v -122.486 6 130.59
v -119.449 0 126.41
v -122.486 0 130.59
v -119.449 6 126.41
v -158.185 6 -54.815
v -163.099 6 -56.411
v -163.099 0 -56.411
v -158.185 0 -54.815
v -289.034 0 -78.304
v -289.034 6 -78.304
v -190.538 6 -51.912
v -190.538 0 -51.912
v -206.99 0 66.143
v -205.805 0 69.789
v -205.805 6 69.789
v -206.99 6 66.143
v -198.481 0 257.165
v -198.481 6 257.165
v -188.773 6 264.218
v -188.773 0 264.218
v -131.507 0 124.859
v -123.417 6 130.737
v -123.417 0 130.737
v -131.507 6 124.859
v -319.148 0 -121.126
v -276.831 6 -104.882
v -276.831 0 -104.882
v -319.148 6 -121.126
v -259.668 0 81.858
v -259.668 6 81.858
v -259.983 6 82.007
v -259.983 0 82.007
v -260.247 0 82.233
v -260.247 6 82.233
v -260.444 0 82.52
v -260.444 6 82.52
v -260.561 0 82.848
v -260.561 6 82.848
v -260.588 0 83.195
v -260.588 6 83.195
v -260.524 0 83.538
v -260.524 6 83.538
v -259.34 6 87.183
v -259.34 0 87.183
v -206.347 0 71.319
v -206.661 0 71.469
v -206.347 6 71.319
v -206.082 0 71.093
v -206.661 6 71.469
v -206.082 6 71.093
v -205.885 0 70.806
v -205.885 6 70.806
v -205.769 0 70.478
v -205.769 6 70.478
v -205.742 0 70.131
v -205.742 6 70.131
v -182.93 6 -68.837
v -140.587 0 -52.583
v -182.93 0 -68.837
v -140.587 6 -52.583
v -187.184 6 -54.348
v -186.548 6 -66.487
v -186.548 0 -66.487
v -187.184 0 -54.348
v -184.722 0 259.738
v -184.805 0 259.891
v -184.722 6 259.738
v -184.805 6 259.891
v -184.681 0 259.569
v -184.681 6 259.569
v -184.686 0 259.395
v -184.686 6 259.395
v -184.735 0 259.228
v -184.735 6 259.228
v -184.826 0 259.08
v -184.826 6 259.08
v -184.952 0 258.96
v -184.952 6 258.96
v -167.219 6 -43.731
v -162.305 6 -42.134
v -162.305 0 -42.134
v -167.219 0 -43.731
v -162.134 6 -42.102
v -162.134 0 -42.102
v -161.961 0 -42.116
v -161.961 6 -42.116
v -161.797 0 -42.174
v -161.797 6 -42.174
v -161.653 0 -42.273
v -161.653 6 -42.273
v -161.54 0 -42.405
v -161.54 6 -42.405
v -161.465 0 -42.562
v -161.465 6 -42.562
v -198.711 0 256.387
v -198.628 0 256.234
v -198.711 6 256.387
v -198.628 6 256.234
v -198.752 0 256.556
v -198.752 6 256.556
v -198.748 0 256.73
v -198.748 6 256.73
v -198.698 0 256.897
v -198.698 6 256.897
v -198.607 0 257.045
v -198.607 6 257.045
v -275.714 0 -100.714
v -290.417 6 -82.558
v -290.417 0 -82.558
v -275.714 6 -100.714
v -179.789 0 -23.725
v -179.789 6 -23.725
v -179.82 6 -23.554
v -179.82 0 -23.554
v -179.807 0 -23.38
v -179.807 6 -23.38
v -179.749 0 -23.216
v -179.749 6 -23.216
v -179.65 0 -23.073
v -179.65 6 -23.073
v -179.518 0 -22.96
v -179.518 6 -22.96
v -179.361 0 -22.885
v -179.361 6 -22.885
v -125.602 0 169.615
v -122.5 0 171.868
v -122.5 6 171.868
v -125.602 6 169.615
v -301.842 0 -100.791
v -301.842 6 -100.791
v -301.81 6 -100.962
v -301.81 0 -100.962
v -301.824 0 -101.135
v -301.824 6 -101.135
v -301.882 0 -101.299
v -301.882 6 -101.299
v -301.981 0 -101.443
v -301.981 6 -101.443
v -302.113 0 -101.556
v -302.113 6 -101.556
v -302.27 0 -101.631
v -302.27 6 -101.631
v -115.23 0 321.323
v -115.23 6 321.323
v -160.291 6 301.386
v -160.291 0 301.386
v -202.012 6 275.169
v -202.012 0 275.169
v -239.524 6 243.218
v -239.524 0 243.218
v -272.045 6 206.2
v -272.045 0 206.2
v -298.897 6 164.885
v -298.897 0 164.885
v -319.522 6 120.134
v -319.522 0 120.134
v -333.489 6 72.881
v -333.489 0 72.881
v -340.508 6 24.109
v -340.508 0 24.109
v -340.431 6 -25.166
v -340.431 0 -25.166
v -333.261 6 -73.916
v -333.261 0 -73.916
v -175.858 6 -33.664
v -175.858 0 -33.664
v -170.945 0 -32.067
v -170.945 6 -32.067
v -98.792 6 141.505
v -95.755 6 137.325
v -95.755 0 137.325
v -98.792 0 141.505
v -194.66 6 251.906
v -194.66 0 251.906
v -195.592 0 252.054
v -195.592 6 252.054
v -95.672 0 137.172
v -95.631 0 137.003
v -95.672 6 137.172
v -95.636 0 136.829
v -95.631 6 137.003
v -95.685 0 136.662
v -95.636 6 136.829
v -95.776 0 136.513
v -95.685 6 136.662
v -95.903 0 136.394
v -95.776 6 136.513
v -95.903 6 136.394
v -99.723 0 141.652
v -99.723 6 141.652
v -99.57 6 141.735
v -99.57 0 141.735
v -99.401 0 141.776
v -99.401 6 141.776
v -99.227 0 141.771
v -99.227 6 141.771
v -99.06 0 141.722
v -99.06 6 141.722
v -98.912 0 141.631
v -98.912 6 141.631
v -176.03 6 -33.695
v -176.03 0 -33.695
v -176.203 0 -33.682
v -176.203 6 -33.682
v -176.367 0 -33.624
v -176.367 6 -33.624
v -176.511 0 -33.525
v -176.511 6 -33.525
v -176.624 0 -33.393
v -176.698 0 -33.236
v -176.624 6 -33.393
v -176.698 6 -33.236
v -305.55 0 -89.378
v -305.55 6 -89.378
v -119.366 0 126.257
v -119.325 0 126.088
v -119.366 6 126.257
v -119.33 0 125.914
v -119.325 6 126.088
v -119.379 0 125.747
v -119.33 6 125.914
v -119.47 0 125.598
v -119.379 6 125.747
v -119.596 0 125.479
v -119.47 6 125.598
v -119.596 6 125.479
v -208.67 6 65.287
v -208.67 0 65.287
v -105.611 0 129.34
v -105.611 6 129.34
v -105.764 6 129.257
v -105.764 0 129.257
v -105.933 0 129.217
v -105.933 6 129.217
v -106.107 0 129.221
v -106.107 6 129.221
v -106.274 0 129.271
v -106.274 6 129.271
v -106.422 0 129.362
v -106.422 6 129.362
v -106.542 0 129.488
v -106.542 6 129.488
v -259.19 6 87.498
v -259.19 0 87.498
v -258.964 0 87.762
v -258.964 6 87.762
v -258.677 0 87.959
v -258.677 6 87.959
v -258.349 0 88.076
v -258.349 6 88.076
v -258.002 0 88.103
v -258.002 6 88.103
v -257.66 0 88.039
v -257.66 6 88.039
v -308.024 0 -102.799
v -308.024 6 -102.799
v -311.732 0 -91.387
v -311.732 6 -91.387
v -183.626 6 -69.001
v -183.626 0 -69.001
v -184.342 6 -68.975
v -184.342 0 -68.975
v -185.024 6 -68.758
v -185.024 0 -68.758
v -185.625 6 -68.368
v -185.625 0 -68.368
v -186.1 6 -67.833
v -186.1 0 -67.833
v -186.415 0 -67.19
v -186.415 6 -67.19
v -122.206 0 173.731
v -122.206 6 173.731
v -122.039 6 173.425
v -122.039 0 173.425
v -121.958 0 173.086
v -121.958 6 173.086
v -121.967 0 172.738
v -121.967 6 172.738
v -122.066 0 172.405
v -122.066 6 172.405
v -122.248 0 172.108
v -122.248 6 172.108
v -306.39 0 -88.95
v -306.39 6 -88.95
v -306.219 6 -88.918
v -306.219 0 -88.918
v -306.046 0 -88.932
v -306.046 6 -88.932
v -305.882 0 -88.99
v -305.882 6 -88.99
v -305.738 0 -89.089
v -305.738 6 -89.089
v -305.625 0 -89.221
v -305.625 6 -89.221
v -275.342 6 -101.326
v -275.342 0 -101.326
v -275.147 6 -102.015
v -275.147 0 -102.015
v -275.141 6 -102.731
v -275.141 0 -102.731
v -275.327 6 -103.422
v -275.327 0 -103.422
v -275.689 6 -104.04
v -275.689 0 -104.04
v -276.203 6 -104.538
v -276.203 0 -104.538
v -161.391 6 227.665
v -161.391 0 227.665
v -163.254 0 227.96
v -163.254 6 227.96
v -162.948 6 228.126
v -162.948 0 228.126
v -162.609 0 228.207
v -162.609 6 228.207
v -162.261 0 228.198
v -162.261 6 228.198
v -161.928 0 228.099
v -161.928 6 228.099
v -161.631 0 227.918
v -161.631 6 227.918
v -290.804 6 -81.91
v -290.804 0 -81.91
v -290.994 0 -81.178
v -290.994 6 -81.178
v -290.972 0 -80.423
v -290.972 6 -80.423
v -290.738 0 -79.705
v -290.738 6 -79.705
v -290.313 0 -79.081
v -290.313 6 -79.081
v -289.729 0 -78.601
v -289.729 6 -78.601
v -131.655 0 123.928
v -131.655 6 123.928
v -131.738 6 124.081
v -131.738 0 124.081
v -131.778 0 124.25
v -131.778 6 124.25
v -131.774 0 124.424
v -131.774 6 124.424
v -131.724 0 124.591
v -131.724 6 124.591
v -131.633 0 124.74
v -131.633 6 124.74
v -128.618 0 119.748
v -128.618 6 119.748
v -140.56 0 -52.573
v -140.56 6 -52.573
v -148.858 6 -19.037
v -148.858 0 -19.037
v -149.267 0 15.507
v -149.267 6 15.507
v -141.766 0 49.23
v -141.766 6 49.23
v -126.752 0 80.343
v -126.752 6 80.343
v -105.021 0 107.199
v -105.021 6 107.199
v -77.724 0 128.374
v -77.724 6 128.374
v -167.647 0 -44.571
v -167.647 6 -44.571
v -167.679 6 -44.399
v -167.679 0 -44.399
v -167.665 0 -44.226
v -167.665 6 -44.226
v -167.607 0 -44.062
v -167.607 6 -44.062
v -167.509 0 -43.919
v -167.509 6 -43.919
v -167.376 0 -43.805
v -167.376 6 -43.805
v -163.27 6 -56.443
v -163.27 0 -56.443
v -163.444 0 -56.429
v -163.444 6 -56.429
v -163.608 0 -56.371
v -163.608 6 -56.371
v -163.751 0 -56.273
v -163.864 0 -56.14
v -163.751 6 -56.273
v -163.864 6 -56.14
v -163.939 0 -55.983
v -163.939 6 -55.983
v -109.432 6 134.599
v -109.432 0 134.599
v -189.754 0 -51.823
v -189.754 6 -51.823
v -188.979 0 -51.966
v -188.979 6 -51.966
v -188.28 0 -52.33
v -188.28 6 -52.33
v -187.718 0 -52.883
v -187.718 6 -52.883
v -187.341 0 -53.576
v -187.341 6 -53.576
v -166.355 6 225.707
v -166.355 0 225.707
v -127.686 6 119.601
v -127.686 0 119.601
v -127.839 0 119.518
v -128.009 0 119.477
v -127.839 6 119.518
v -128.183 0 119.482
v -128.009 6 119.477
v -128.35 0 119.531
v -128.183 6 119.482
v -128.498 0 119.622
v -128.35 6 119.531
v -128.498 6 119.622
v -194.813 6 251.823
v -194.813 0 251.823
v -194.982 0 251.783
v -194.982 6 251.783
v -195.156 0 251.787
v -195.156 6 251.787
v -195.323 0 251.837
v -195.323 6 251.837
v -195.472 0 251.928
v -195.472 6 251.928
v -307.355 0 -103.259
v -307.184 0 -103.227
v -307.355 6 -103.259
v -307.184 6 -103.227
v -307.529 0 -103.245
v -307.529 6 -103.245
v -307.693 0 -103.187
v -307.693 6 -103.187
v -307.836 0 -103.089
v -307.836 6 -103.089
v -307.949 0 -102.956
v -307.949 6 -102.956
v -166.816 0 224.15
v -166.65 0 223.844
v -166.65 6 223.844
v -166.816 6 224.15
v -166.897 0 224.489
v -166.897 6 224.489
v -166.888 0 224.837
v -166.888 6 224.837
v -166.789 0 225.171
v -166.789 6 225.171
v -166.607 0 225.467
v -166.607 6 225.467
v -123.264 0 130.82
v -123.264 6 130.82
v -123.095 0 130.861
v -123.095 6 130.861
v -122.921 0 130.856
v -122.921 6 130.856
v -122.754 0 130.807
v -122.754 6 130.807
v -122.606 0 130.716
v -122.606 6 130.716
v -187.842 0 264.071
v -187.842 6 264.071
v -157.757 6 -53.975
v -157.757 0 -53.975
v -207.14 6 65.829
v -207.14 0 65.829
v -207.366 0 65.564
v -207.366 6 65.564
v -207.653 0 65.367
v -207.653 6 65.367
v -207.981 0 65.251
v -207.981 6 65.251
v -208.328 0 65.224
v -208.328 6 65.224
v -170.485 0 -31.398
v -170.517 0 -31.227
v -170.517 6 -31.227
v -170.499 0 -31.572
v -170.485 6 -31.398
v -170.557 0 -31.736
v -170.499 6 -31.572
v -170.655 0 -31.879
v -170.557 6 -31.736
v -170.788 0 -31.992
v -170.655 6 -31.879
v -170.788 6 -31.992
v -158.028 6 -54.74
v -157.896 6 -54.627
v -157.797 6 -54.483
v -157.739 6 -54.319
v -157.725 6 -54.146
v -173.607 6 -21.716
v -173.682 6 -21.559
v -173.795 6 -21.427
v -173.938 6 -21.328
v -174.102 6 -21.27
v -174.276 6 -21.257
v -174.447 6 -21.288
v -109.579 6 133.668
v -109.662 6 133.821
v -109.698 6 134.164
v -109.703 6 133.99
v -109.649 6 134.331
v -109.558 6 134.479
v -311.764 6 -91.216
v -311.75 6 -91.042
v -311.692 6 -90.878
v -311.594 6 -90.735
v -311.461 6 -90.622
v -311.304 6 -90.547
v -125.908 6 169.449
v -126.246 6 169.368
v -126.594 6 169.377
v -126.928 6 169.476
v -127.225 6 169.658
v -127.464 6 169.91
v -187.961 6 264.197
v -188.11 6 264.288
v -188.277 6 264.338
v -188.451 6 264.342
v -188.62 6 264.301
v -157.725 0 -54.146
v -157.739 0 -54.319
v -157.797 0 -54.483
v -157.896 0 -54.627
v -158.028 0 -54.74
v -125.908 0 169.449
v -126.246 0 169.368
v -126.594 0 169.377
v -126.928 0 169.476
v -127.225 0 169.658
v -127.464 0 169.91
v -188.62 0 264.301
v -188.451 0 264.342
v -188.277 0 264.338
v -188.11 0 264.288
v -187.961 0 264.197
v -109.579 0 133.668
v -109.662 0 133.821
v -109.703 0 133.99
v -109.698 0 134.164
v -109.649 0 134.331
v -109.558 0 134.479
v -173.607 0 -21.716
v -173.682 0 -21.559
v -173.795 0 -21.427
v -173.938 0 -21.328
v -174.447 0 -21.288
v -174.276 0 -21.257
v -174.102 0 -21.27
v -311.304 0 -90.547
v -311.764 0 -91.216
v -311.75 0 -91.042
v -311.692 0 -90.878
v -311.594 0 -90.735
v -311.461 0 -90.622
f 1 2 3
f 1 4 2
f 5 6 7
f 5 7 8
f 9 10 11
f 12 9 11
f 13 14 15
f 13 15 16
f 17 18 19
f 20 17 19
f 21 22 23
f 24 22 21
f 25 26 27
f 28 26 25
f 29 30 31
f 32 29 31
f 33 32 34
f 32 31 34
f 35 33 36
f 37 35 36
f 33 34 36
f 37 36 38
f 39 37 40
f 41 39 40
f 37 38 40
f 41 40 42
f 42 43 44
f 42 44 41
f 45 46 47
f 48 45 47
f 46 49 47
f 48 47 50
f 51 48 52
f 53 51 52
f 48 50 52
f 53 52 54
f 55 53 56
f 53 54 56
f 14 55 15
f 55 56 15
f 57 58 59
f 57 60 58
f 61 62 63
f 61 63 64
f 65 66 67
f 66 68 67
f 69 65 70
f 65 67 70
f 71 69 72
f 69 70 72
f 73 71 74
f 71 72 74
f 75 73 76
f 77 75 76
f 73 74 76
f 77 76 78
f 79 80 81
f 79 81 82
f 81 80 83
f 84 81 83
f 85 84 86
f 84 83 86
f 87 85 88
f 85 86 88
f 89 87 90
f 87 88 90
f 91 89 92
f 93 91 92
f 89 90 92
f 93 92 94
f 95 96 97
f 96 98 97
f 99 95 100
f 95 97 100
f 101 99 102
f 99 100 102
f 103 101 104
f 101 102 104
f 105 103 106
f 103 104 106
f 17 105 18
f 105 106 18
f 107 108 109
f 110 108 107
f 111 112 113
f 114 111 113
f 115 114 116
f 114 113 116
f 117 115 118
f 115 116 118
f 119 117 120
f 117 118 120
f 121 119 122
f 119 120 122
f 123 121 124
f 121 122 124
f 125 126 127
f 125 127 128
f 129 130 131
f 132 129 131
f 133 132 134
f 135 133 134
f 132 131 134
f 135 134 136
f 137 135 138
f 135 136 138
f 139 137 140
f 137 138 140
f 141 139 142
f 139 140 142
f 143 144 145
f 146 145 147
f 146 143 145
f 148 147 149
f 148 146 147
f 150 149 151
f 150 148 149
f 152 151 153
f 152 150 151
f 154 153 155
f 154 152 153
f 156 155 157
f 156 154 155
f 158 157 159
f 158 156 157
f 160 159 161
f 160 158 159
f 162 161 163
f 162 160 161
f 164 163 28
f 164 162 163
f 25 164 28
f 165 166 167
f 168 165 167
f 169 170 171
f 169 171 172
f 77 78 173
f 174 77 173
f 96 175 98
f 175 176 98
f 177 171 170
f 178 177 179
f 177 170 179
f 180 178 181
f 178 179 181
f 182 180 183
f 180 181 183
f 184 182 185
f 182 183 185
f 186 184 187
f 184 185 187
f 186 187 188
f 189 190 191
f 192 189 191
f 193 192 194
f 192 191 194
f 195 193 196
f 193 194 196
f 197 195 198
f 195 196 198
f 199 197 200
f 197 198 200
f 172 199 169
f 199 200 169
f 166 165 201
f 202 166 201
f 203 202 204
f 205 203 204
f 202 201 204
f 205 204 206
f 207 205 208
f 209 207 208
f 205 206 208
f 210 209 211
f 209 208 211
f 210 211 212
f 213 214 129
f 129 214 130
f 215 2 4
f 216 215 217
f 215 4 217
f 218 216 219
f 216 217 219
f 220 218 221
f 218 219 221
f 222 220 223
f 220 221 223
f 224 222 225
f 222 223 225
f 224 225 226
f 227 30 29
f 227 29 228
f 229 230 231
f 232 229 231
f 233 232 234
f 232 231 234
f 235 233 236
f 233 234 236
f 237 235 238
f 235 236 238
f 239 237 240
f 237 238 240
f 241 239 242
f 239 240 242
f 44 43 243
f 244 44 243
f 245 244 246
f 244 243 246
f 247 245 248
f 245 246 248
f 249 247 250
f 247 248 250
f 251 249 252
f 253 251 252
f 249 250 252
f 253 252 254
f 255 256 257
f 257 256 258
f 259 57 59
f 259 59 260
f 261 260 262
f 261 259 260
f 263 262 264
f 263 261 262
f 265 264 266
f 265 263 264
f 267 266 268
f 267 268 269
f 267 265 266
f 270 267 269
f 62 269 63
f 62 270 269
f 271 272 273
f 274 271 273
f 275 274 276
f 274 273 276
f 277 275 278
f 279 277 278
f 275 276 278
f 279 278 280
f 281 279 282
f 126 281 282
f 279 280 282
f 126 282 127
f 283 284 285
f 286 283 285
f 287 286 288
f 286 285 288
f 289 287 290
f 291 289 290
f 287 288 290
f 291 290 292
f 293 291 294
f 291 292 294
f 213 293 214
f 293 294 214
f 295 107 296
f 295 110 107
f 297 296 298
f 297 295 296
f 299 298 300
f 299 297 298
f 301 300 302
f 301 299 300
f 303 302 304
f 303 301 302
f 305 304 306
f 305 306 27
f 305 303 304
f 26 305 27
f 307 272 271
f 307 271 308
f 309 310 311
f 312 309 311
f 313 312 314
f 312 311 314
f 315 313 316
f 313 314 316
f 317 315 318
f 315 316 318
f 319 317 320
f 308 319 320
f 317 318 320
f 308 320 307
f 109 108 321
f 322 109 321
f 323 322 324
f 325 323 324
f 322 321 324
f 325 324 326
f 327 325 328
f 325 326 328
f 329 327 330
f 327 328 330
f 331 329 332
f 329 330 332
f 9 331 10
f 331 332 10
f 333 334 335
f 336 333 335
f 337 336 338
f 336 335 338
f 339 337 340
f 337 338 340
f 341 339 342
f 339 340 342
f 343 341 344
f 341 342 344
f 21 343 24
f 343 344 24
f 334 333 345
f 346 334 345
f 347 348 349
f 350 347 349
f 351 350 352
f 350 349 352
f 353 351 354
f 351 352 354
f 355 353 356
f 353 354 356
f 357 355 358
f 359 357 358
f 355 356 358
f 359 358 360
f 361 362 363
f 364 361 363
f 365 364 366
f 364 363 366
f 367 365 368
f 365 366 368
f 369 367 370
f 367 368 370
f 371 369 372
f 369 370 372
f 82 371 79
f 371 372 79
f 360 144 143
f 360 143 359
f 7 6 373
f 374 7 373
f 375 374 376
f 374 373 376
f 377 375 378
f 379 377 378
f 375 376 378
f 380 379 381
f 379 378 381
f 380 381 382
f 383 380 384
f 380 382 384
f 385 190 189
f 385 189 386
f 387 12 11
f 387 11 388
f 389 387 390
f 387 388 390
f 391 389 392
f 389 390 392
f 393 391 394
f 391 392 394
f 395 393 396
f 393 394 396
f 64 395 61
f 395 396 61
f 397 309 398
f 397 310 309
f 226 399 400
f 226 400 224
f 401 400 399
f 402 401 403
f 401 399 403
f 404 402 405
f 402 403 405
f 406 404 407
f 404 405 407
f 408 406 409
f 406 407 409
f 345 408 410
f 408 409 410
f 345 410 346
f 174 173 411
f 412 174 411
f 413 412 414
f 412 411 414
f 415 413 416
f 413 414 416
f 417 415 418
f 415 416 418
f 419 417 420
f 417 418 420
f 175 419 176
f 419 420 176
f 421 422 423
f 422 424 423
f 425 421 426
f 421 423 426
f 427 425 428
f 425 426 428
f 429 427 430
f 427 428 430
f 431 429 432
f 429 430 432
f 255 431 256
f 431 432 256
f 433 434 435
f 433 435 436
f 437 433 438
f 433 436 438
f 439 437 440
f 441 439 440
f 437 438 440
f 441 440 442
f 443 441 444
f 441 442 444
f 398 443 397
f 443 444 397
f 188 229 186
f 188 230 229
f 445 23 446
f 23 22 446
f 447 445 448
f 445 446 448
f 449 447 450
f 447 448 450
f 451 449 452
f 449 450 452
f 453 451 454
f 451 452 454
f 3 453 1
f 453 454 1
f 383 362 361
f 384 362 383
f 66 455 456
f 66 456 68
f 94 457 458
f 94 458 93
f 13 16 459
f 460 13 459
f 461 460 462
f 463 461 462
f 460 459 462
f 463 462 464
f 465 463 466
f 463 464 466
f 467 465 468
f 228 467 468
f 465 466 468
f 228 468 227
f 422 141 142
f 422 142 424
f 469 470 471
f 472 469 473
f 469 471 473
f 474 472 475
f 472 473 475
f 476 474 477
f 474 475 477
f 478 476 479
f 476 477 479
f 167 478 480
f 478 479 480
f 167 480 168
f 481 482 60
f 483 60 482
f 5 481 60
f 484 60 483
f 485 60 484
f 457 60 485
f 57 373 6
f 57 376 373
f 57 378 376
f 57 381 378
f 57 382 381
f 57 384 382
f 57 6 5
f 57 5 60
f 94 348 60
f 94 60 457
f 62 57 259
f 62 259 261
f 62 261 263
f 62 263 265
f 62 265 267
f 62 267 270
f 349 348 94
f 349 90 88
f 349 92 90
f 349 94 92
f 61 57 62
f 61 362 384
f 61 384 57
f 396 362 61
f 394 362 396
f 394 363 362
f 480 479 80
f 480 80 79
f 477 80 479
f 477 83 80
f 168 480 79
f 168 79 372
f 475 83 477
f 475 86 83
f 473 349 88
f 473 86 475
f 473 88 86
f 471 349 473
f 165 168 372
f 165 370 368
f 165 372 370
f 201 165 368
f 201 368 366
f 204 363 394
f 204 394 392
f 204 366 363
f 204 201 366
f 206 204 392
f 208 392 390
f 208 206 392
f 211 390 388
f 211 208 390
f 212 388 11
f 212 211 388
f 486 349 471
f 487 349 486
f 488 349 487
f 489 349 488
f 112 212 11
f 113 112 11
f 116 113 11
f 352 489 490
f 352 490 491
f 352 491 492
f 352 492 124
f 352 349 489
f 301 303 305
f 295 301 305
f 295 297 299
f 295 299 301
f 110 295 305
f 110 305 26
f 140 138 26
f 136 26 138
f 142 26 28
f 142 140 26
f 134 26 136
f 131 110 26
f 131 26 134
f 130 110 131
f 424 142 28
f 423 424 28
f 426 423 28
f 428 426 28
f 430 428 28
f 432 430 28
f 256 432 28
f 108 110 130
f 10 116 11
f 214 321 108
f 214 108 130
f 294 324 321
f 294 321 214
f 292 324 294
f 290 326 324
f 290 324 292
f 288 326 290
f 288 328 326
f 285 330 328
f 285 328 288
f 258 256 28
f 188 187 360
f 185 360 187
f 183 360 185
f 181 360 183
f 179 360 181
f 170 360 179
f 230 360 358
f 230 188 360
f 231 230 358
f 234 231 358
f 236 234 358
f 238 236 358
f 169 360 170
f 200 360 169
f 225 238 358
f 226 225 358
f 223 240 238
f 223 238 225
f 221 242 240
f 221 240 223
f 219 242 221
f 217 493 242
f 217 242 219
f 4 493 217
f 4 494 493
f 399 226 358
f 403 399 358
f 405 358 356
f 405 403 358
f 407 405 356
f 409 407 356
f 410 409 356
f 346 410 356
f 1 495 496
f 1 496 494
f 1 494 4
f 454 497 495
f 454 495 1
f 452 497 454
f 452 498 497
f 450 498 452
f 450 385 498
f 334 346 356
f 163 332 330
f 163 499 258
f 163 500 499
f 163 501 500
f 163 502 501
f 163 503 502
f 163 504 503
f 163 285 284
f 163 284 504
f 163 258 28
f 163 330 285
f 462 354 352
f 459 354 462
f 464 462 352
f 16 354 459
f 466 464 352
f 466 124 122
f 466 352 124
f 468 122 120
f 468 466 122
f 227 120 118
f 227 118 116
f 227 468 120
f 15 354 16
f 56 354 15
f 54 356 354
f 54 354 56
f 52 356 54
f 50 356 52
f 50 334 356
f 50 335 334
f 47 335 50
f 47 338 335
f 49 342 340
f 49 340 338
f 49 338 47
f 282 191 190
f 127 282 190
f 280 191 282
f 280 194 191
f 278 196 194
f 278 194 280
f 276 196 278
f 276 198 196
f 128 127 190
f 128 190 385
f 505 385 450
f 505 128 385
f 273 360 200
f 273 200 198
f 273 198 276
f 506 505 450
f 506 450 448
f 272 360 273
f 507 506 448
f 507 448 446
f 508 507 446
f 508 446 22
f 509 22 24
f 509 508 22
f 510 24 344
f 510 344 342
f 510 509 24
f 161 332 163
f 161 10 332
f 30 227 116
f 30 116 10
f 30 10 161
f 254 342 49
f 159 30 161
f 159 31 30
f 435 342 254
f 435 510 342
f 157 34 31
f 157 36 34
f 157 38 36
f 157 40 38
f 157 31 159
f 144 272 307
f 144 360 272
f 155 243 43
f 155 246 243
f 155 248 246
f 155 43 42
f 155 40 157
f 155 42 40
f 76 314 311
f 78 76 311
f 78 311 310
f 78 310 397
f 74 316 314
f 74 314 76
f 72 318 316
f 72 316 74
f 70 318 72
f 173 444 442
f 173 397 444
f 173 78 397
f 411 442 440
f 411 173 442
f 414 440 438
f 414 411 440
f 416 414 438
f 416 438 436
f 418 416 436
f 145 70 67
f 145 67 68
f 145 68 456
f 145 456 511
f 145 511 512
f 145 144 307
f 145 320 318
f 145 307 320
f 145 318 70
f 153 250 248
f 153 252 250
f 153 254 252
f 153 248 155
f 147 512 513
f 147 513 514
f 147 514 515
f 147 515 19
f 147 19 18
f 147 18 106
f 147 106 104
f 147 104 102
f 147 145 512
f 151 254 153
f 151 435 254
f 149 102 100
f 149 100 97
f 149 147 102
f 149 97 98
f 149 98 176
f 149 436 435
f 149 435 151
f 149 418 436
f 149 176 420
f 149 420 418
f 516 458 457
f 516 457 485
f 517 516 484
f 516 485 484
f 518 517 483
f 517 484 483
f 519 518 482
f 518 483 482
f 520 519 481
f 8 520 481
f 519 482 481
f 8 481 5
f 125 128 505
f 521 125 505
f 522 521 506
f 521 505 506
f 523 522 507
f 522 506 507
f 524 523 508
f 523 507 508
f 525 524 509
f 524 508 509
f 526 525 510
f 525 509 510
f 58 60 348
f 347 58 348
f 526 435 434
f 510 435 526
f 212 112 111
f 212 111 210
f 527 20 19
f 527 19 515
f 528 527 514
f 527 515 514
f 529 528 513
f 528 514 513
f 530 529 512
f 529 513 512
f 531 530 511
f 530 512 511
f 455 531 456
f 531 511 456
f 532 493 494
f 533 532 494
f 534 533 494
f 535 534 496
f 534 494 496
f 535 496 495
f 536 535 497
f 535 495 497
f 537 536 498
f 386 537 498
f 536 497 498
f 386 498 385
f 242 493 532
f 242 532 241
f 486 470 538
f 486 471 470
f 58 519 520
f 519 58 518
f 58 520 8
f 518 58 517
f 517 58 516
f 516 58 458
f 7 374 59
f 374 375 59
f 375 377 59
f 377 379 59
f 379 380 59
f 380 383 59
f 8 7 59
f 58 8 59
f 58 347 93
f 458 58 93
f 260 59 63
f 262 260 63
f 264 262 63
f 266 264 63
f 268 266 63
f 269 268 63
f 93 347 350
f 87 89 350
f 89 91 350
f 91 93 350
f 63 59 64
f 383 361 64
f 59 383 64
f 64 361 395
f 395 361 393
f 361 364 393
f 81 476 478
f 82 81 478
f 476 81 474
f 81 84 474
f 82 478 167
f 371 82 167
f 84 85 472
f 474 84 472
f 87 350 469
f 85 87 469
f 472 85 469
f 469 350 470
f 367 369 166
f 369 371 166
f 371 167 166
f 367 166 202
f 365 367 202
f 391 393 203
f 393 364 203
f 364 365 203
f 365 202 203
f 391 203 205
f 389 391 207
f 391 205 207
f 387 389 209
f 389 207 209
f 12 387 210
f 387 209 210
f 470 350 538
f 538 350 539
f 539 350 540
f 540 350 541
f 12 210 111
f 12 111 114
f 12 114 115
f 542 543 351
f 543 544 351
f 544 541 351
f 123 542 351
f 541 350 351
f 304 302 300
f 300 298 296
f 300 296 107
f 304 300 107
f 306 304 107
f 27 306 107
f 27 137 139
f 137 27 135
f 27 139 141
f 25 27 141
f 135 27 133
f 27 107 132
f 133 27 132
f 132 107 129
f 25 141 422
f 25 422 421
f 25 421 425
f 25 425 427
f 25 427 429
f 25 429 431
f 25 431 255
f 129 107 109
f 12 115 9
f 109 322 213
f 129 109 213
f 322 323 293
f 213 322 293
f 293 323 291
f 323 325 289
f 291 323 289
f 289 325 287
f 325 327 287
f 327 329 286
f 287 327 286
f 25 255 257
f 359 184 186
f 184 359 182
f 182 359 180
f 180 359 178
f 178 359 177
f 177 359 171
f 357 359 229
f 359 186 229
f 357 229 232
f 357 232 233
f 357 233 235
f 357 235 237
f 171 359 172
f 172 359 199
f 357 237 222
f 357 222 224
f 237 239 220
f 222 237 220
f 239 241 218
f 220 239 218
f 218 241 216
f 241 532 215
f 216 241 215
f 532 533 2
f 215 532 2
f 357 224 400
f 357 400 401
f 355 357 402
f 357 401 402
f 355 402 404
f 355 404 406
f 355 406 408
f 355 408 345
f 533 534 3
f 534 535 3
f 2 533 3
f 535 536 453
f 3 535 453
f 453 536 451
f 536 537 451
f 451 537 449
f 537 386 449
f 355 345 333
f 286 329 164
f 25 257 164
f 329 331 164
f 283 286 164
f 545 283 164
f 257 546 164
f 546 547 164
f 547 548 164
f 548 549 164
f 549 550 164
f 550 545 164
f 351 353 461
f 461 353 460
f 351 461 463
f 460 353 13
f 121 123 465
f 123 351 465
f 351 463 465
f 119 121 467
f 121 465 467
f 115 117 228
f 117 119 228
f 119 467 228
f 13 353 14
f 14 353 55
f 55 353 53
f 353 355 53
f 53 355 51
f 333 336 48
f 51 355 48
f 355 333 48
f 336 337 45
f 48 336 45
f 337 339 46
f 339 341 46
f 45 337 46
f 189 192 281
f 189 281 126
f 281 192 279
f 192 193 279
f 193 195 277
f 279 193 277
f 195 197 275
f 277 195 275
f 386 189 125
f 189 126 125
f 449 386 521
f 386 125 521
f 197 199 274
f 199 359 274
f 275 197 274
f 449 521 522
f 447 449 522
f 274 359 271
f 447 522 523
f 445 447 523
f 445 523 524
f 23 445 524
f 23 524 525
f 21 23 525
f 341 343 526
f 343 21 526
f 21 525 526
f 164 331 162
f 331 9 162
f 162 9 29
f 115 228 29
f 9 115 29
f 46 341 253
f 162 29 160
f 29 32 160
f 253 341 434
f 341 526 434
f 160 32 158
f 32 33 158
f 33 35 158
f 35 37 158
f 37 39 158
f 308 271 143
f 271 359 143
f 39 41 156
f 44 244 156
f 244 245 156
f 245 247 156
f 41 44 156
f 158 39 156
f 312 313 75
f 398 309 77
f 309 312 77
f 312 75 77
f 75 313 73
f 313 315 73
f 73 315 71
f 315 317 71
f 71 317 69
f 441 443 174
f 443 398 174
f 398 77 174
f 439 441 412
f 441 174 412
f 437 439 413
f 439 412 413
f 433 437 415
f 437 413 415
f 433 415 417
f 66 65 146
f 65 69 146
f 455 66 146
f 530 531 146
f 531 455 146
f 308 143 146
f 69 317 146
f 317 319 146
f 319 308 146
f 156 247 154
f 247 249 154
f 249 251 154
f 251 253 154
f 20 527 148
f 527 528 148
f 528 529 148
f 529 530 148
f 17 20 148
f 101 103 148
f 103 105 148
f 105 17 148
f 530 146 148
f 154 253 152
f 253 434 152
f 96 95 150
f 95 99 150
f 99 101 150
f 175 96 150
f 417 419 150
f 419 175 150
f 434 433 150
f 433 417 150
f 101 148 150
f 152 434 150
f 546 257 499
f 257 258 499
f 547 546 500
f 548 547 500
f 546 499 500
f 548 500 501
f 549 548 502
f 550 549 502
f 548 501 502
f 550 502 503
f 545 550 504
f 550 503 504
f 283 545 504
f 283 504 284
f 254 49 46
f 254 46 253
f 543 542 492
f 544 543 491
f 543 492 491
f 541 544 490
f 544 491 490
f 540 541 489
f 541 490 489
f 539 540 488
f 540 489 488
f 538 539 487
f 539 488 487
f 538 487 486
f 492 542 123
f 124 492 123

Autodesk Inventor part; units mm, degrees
ref_plane "YZ Plane" through (0, 0, 0) normal (1, 0, 0) x (0, 1, 0)
ref_plane "XZ Plane" through (0, 0, 0) normal (0, 1, 0) x (-1, 0, 0)
sketch "Sketch1" plane through (0, 0, 0) normal (0, 1, 0) x (-1, 0, 0)
  circle A0 centre (0, 0) radius 341.36
  circle A1 centre (0, 0) radius 150.07
  dimension "d84" = 300.14
  dimension "d85" = 682.72
extrude "Extrusion3" add sketch "Sketch1" along normal blind 6 contours A0 | A1
sketch "Sketch2" plane through (0, 6, 0) normal (0, 1, 0) x (1, 0, 0)
  circle A0 centre (0, 0) radius 245.715 construction
  line L0 (245.7148, 0.3131) -> (341.6521, -0.0088)
  line L1 (-0.6289, 279.0483) -> (-0.0524, 279.0483)
  line L2 (3.25, 279.0483) -> (3.25, 212.3817)
  line L3 (0.5377, 212.3817) -> (-0.051, 212.3817)
  line L4 (-3.25, 212.3817) -> (-3.25, 279.0483)
  arc A1 (-3.25, 212.3817) -> (-1.9167, 211.0483) centre (-1.9167, 212.3817) ccw
  arc A2 (1.9167, 211.0483) -> (3.25, 212.3817) centre (1.9167, 212.3817) ccw
  arc A3 (-1.9167, 280.3817) -> (-3.25, 279.0483) centre (-1.9167, 279.0483) ccw
  arc A4 (3.25, 279.0483) -> (1.9167, 280.3817) centre (1.9167, 279.0483) ccw
  line L5 (-1.9167, 280.3817) -> (1.9167, 280.3817)
  line L6 (-1.9167, 211.0483) -> (1.9167, 211.0483)
  line L7 (0, 0) -> (0, 212.3817)
  line L8 (0, 280.3817) -> (0, 341.36)
  line L9 (0, 211.0483) -> (0, 245.715) construction
  line L10 (0, 280.3817) -> (0, 245.715) construction
  arc A5 (-157.4948, 221.8428) -> (-159.3572, 222.1378) centre (-158.5735, 221.0591) ccw
  line L11 (-162.4585, 219.8846) -> (-159.3572, 222.1378)
  arc A6 (-162.4585, 219.8846) -> (-162.7534, 218.0222) centre (-161.6748, 218.8059) ccw
  line L12 (-160.9079, 221.0112) -> (-144.3647, 198.2416) construction
  line L13 (-160.633, 219.5628) -> (-160.1666, 219.9017)
  line L14 (-157.4948, 221.8428) -> (-125.976, 178.4609)
  line L15 (-131.2346, 174.6403) -> (-162.7534, 218.0222)
  line L16 (-127.8216, 175.4719) -> (-144.3647, 198.2416) construction
  line L17 (-128.1703, 176.8667) -> (-128.6466, 176.5206)
  arc A7 (-126.271, 176.5985) -> (-125.976, 178.4609) centre (-127.0547, 177.6772) ccw
  line L18 (-129.3722, 174.3453) -> (-126.271, 176.5985)
  arc A8 (-131.2346, 174.6403) -> (-129.3722, 174.3453) centre (-130.156, 175.424) ccw
  arc A9 (-259.6684, -81.8575) -> (-260.5244, -83.5376) centre (-259.2564, -83.1256) ccw
  line L19 (-259.3399, -87.1834) -> (-260.5244, -83.5376)
  arc A10 (-259.3399, -87.1834) -> (-257.6598, -88.0394) centre (-258.0718, -86.7713) ccw
  line L20 (-259.9321, -85.3605) -> (-233.1648, -76.6633) construction
  line L21 (-258.4697, -85.5466) -> (-258.6479, -84.9983)
  line L22 (-259.6684, -81.8575) -> (-208.6699, -65.2871)
  line L23 (-206.6613, -71.469) -> (-257.6598, -88.0394)
  line L24 (-206.3975, -67.966) -> (-233.1648, -76.6633) construction
  line L25 (-207.8317, -67.8666) -> (-207.6498, -68.4265)
  arc A11 (-206.9898, -66.1432) -> (-208.6699, -65.2871) centre (-208.2578, -66.5552) ccw
  line L26 (-205.8052, -69.7889) -> (-206.9898, -66.1432)
  arc A12 (-206.6613, -71.469) -> (-205.8052, -69.7889) centre (-207.0733, -70.2009) ccw
  arc A13 (258.6901, -87.4674) -> (260.3702, -86.6114) centre (259.1021, -86.1993) ccw
  line L27 (261.5548, -82.9657) -> (260.3702, -86.6114)
  arc A14 (261.5548, -82.9657) -> (260.6987, -81.2856) centre (260.2867, -82.5536) ccw
  line L28 (260.9625, -84.7885) -> (234.1951, -76.0913) construction
  line L29 (259.8887, -83.7783) -> (259.7106, -84.3266)
  line L30 (258.6901, -87.4674) -> (207.6916, -70.897)
  line L31 (209.7002, -64.7151) -> (260.6987, -81.2856)
  line L32 (207.4278, -67.394) -> (234.1951, -76.0913) construction
  line L33 (208.5297, -68.3175) -> (208.7116, -67.7576)
  arc A15 (206.8355, -69.2169) -> (207.6916, -70.897) centre (208.1036, -69.6289) ccw
  line L34 (208.0201, -65.5712) -> (206.8355, -69.2169)
  arc A16 (209.7002, -64.7151) -> (208.0201, -65.5712) centre (209.2882, -65.9832) ccw
  arc A17 (162.9147, 218.5186) -> (162.6198, 220.381) centre (161.836, 219.3023) ccw
  line L35 (159.5185, 222.6342) -> (162.6198, 220.381)
  arc A18 (159.5185, 222.6342) -> (157.6561, 222.3392) centre (158.7348, 221.5555) ccw
  line L36 (161.0691, 221.5076) -> (144.526, 198.7379) construction
  line L37 (159.7766, 220.7986) -> (160.243, 220.4597)
  line L38 (162.9147, 218.5186) -> (131.3959, 175.1367)
  line L39 (126.1373, 178.9573) -> (157.6561, 222.3392)
  line L40 (127.9829, 175.9683) -> (144.526, 198.7379) construction
  line L41 (129.2017, 176.7309) -> (128.7254, 177.0769)
  arc A19 (129.5335, 174.8417) -> (131.3959, 175.1367) centre (130.3172, 175.9204) ccw
  line L42 (126.4323, 177.0949) -> (129.5335, 174.8417)
  arc A20 (126.1373, 178.9573) -> (126.4323, 177.0949) centre (127.216, 178.1736) ccw
  line L43 (-265.5851, 85.6325) -> (-265.4069, 86.1808)
  line L44 (-267.2511, 84.8198) -> (-266.0665, 88.4656)
  line L45 (-201.3112, 63.3947) -> (-200.1266, 67.0404)
  arc A21 (-267.2511, 84.8198) -> (-266.395, 83.1397) centre (-265.983, 84.4078) ccw
  arc A22 (-264.3864, 89.3216) -> (-266.0665, 88.4656) centre (-264.7985, 88.0535) ccw
  line L46 (-266.6588, 86.6427) -> (-233.6889, 75.9301) construction
  line L47 (-202.9913, 62.5386) -> (-266.395, 83.1397)
  line L48 (-264.3864, 89.3216) -> (-200.9827, 68.7205)
  line L49 (-200.7189, 65.2175) -> (-233.6889, 75.9301) construction
  arc A23 (-202.9913, 62.5386) -> (-201.3112, 63.3947) centre (-202.5793, 63.8067) ccw
  arc A24 (-200.1266, 67.0404) -> (-200.9827, 68.7205) centre (-201.3947, 67.4524) ccw
  line L50 (-201.8208, 66.141) -> (-202.0027, 65.5811)
  line L51 (-163.5117, -226.1245) -> (-163.9781, -225.7857)
  line L52 (-163.2536, -227.9601) -> (-166.3548, -225.7069)
  line L53 (-122.5005, -171.8683) -> (-125.6017, -169.6151)
  arc A25 (-163.2536, -227.9601) -> (-161.3912, -227.6651) centre (-162.4699, -226.8814) ccw
  arc A26 (-166.6498, -223.8445) -> (-166.3548, -225.7069) centre (-165.5711, -224.6283) ccw
  line L54 (-164.8042, -226.8335) -> (-144.4277, -198.7876) construction
  line L55 (-122.2055, -173.7307) -> (-161.3912, -227.6651)
  line L56 (-166.6498, -223.8445) -> (-127.4641, -169.9101)
  line L57 (-124.0511, -170.7417) -> (-144.4277, -198.7876) construction
  arc A27 (-122.2055, -173.7307) -> (-122.5005, -171.8683) centre (-123.2842, -172.947) ccw
  arc A28 (-125.6017, -169.6151) -> (-127.4641, -169.9101) centre (-126.3854, -170.6938) ccw
  line L58 (-125.2699, -171.5043) -> (-124.7936, -171.8503)
  line L59 (164.5293, -225.3852) -> (164.0629, -225.724)
  line L60 (166.3548, -225.7069) -> (163.2536, -227.9601)
  line L61 (125.6017, -169.6151) -> (122.5005, -171.8683)
  arc A29 (166.3548, -225.7069) -> (166.6498, -223.8445) centre (165.5711, -224.6283) ccw
  arc A30 (161.3912, -227.6651) -> (163.2536, -227.9601) centre (162.4699, -226.8814) ccw
  line L62 (164.8042, -226.8335) -> (144.4277, -198.7876) construction
  line L63 (127.4641, -169.9101) -> (166.6498, -223.8445)
  line L64 (161.3912, -227.6651) -> (122.2055, -173.7307)
  line L65 (124.0511, -170.7417) -> (144.4277, -198.7876) construction
  arc A31 (127.4641, -169.9101) -> (125.6017, -169.6151) centre (126.3854, -170.6938) ccw
  arc A32 (122.5005, -171.8683) -> (122.2055, -173.7307) centre (123.2842, -172.947) ccw
  line L66 (124.3998, -172.1365) -> (124.8761, -171.7904)
  line L67 (265.1964, 86.8288) -> (265.3745, 86.2805)
  line L68 (266.0665, 88.4656) -> (267.2511, 84.8198)
  line L69 (200.1266, 67.0404) -> (201.3112, 63.3947)
  arc A33 (266.0665, 88.4656) -> (264.3864, 89.3216) centre (264.7985, 88.0535) ccw
  arc A34 (266.395, 83.1397) -> (267.2511, 84.8198) centre (265.983, 84.4078) ccw
  line L70 (266.6588, 86.6427) -> (233.6889, 75.9301) construction
  line L71 (200.9827, 68.7205) -> (264.3864, 89.3216)
  line L72 (266.395, 83.1397) -> (202.9913, 62.5386)
  line L73 (200.7189, 65.2175) -> (233.6889, 75.9301) construction
  arc A35 (200.9827, 68.7205) -> (200.1266, 67.0404) centre (201.3947, 67.4524) ccw
  arc A36 (201.3112, 63.3947) -> (202.9913, 62.5386) centre (202.5793, 63.8067) ccw
  line L74 (202.1531, 65.1181) -> (201.9712, 65.678)
  line L75 (236.8664, -101.279) -> (236.7913, -101.5102)
  point P0 (-128.6053, 176.5506)
  point P1 (-207.6656, -68.3781)
  point P2 (208.6959, -67.8061)
  point P3 (128.7666, 177.047)
  point P4 (-201.987, 65.6295)
  point P5 (-124.8348, -171.8204)
  point P6 (124.8348, -171.8204)
  point P7 (201.987, 65.6295)
  dimension "d21" = 6.5
  dimension "d23" = 66.6667
  dimension "d24" = 2.6667
  dimension "d25" = 2.6667
  dimension "d32" = 1.3333
  dimension "d33" = 1.3333
  dimension "d41" = 90
  dimension "d42" = 3.25
  dimension "d43" = 90
  dimension "d49" = 360
  dimension "d86" = 491.43
  dimension "d96" = 0.243
extrude "Extrusion4" cut sketch "Sketch2" against normal through all
sketch "Sketch3" plane through (0, 6, 0) normal (0, 1, 0) x (1, 0, 0)
  arc A0 (-115.2299, -321.3234) -> (115.2355, -321.3214) centre (0, 0) ccw
  arc A1 (-77.7244, -128.3741) -> (77.7297, -128.3709) centre (0, 0) ccw
  line L0 (-122.1811, -173.696) -> (-161.3589, -227.6196)
  line L1 (-115.2299, -321.3234) -> (-77.7244, -128.3741)
  line L2 (0, 0) -> (0, -341.2918)
  line L3 (115.2355, -321.3214) -> (77.7297, -128.3709)
  line L4 (161.3912, -227.6651) -> (122.2055, -173.7307) projected
  dimension "d52" = 25
  dimension "d87" = 150.07
  dimension "d88" = 341.36
  dimension "d89" = 25
  dimension "d90" = 11
  dimension "d91" = 11
extrude "Extrusion5" cut sketch "Sketch3" against normal blind 10
sketch "Sketch5" plane through (0, 6, 0) normal (0, 1, 0) x (1, 0, 0)
  line L0 (3.25, 279.0483) -> (3.25, 212.3817) projected
  line L1 (5.5862, 197.9634) -> (-6.155, 194.8174)
  line L2 (-11.2263, 301.7146) -> (10.5847, 293.3421)
  line L3 (6.5657, 149.9554) -> (8.9394, 195.248)
  line L4 (14.2034, 295.6921) -> (16.5771, 340.9846)
  arc A0 (10.5847, 293.3421) -> (14.2034, 295.6921) centre (11.5404, 295.8316) ccw
  arc A1 (8.9394, 195.248) -> (5.5862, 197.9634) centre (6.2763, 195.3876) ccw
  arc A2 (-11.2263, 301.7146) -> (-14.8449, 299.0854) centre (-12.1819, 299.225) ccw
  line L5 (-3.25, 212.3817) -> (-3.25, 279.0483) projected
  line L6 (-14.8449, 299.0854) -> (-9.5081, 197.2536)
  arc A3 (-9.5081, 197.2536) -> (-6.155, 194.8174) centre (-6.8451, 197.3932) ccw
  line L7 (-1.9167, 211.0483) -> (1.9167, 211.0483) projected
  line L8 (1.9167, 280.3817) -> (-1.9167, 280.3817) projected
  arc A4 (115.2355, -321.3214) -> (-115.2299, -321.3234) centre (0, 0) ccw
  line L9 (16.5771, 340.9846) -> (16.5774, 340.9903)
  arc A5 (-190.5375, 51.9119) -> (-187.1843, 54.3482) centre (-189.8473, 54.4877) ccw
  line L10 (-186.5481, 66.4868) -> (-187.1843, 54.3482)
  arc A6 (-182.9295, 68.8368) -> (-186.5481, 66.4868) centre (-183.8851, 66.3472) ccw
  arc A7 (-275.714, 100.7144) -> (-276.8308, 104.8821) centre (-277.7864, 102.3926) ccw
  line L11 (-289.0345, 78.3041) -> (-190.5375, 51.9119)
  arc A8 (-290.4167, 82.5581) -> (-289.0345, 78.3041) centre (-288.3443, 80.8799) ccw
  line L12 (-290.4167, 82.5581) -> (-275.714, 100.7144)
  line L13 (-276.8308, 104.8821) -> (-319.1731, 121.1358)
  line L14 (-140.5872, 52.5831) -> (-182.9295, 68.8368)
  line L15 (-319.1731, 121.1358) -> (-319.1784, 121.1378)
  arc A9 (184.6611, 69.9975) -> (183.3803, 66.0556) centre (185.6168, 67.508) ccw
  line L16 (190.0006, 55.8613) -> (183.3803, 66.0556)
  arc A10 (188.4543, 51.8331) -> (190.0006, 55.8613) centre (187.7641, 54.4089) ccw
  arc A11 (282.2558, 80.581) -> (285.609, 77.8656) centre (284.9188, 80.4414) ccw
  line L17 (279.8598, 106.5409) -> (184.6611, 69.9975)
  arc A12 (283.4785, 103.9117) -> (279.8598, 106.5409) centre (280.8155, 104.0513) ccw
  line L18 (283.4785, 103.9117) -> (282.2558, 80.581)
  line L19 (285.609, 77.8656) -> (329.4183, 89.6043)
  line L20 (144.645, 40.0945) -> (188.4543, 51.8331)
  line L21 (329.4183, 89.6043) -> (329.4238, 89.6058)
  circle A13 centre (0, 0) radius 150.07
  line L22 (-140.5872, 52.5831) -> (-140.5479, 52.568)
  line L23 (144.645, 40.0945) -> (144.5122, 40.0589)
  line L24 (6.5657, 149.9554) -> (6.5621, 149.8874)
  arc A14 (-77.7244, -128.3741) -> (77.7297, -128.3709) centre (0, 0) ccw projected
  arc A15 (115.2355, -321.3214) -> (-115.2299, -321.3234) centre (0, 0) ccw projected
  line L25 (77.7297, -128.3709) -> (115.2355, -321.3214)
  line L26 (-77.7244, -128.3741) -> (-115.2299, -321.3234)
  point P0 (-77.7399, -128.3998)
  point P1 (77.7399, -128.3998)
  point P2 (-319.1475, 121.126)
  point P3 (-140.56, 52.5727)
  point P4 (6.5642, 149.9264)
  point P5 (16.5757, 340.9573)
  point P6 (329.3918, 89.5972)
  point P7 (144.6169, 40.0869)
  dimension "d63" = 2.6667
  dimension "d64" = 3
  dimension "d66" = 3
  dimension "d67" = 2.6667
  dimension "d68" = 2.6667
  dimension "d70" = 72
  dimension "d71" = 72
  dimension "d94" = 300.14
  dimension "d95" = 682.72
sketch "Sketch6" plane through (0, 6, 0) normal (0, 1, 0) x (1, 0, 0)
  line L0 (188.7727, -264.2184) -> (198.4809, -257.165)
  line L1 (194.6603, -251.9064) -> (184.9521, -258.9598)
  line L2 (161.3912, -227.6651) -> (122.2055, -173.7307) projected
  line L3 (166.3548, -225.7069) -> (163.2536, -227.9601) projected
  arc A0 (195.5915, -252.0539) -> (194.6603, -251.9064) centre (195.0522, -252.4457) ccw
  arc A1 (198.4809, -257.165) -> (198.6284, -256.2338) centre (198.0891, -256.6256) ccw
  arc A2 (187.8415, -264.0709) -> (188.7727, -264.2184) centre (188.3809, -263.6791) ccw
  arc A3 (184.9521, -258.9598) -> (184.8046, -259.891) centre (185.344, -259.4991) ccw
  line L4 (184.8046, -259.891) -> (187.8415, -264.0709)
  line L5 (198.6284, -256.2338) -> (195.5915, -252.0539)
  line L6 (122.2055, -173.7307) -> (161.3912, -227.6651) projected
  line L7 (141.7983, -200.6979) -> (147.057, -196.8773)
  line L8 (166.6498, -223.8445) -> (127.4641, -169.9101) projected
  line L9 (95.9027, -136.3937) -> (105.6109, -129.3403)
  line L10 (109.4315, -134.5989) -> (99.7233, -141.6523)
  arc A4 (109.4315, -134.5989) -> (109.579, -133.6677) centre (109.0396, -134.0596) ccw
  arc A5 (106.5421, -129.4878) -> (105.6109, -129.3403) centre (106.0027, -129.8796) ccw
  arc A6 (95.9027, -136.3937) -> (95.7552, -137.3249) centre (96.2945, -136.9331) ccw
  arc A7 (98.7921, -141.5048) -> (99.7233, -141.6523) centre (99.3314, -141.113) ccw
  line L11 (98.7921, -141.5048) -> (95.7552, -137.3249)
  line L12 (106.5421, -129.4878) -> (109.579, -133.6677)
  point P0 (0, 0)
  dimension "d104" = 6.5
  dimension "d105" = 12
  dimension "d108" = 1.3333
  dimension "d109" = 1.3333
  dimension "d110" = 1.3333
  dimension "d111" = 1.3333
  dimension "d112" = 0
  dimension "d149" = 145
  dimension "d150" = 90
  dimension "d151" = 90
  dimension "d152" = 90
  dimension "d153" = 90
extrude "Extrusion7" cut sketch "Sketch6" against normal through all
sketch "Sketch7" plane through (0, 6, 0) normal (0, 1, 0) x (1, 0, 0)
  line L0 (119.5964, -125.4786) -> (127.6865, -119.6008)
  line L1 (106.4838, -136.3528) -> (96.7756, -143.4062)
  line L2 (128.6177, -119.7483) -> (131.6546, -123.9282)
  line L3 (131.5071, -124.8594) -> (123.417, -130.7373)
  line L4 (122.4858, -130.5898) -> (119.4489, -126.4098)
  line L5 (103.5944, -131.2417) -> (106.6313, -135.4216)
  arc A0 (119.5964, -125.4786) -> (119.4489, -126.4098) centre (119.9882, -126.018) ccw
  arc A1 (122.4858, -130.5898) -> (123.417, -130.7373) centre (123.0251, -130.1979) ccw
  arc A2 (128.6177, -119.7483) -> (127.6865, -119.6008) centre (128.0784, -120.1401) ccw
  arc A3 (131.5071, -124.8594) -> (131.6546, -123.9282) centre (131.1153, -124.3201) ccw
  line L6 (173.6068, 21.7165) -> (170.5167, 31.227)
  line L7 (170.9447, 32.0671) -> (175.8585, 33.6637)
  line L8 (176.6985, 33.2357) -> (179.7887, 23.7251)
  line L9 (179.3607, 22.885) -> (174.4469, 21.2885)
  arc A4 (173.6068, 21.7165) -> (174.4469, 21.2885) centre (174.2409, 21.9225) ccw
  arc A5 (179.3607, 22.885) -> (179.7887, 23.7251) centre (179.1547, 23.5191) ccw
  arc A6 (170.9447, 32.0671) -> (170.5167, 31.227) centre (171.1507, 31.4331) ccw
  arc A7 (176.6985, 33.2357) -> (175.8585, 33.6637) centre (176.0645, 33.0296) ccw
  line L10 (188.4543, 51.8331) -> (144.6169, 40.0869) projected
  line L11 (201.3112, 63.3947) -> (200.1266, 67.0404) projected
  line L12 (179.8921, 12.7927) -> (180.0981, 12.1586)
  line L13 (183.5904, 29.3861) -> (183.8471, 29.4696)
  point P0 (0, 0)
  dimension "d116" = 1.3333
  dimension "d117" = 1.3333
  dimension "d119" = 1.3333
  dimension "d120" = 1.3333
  dimension "d121" = 6.5
  dimension "d122" = 10
  dimension "d126" = 1.09
  dimension "d127" = 16.3333
  dimension "d128" = 1.3333
  dimension "d129" = 1.3333
  dimension "d130" = 1.3333
  dimension "d131" = 1.3333
  dimension "d132" = 6.5
  dimension "d133" = 10
  dimension "d135" = 3
  dimension "d140" = 0.6667
  dimension "d148" = 0.27
extrude "Extrusion8" cut sketch "Sketch7" against normal through all contours L0 A2 L2 A3 L3 A1 L4 A0
extrude "Extrusion9" cut sketch "Sketch7" against normal through all contours L6 A6 L7 A7 L8 A5 L9 A4
ref_plane "Work Plane1" through (265.3907, 0, -86.2307) normal (0.309, 0, 0.9511) x (0.9511, 0, -0.309)
mirror "Mirror2" about plane through (265.3907, 0, -86.2307) normal (0.309, 0, 0.9511) of "Extrusion9"
mirror "Mirror1" about plane through (0, 0, 0) normal (1, 0, 0) of "Extrusion8", "Extrusion9", "Mirror2"
pattern_circular "Circular Pattern1" count 2 over 72 about axis through (0, -10, 0) along (0, 1, 0) of "Extrusion9", "Mirror2"
pattern_circular "Circular Pattern2" count 2 over 72 about axis through (0, -10, 0) along (0, 1, 0) of "Extrusion7"
pattern_circular "Circular Pattern3" count 2 over 144 about axis through (0, -10, 0) along (0, 1, 0) of "Extrusion7"
mirror "Mirror3" about plane through (0, 0, 0) normal (1, 0, 0) of "Extrusion7"
pattern_circular "Circular Pattern4" count 2 over 144 about axis through (0, -10, 0) along (0, -1, 0) of "Extrusion7"
extrude "Extrusion10" cut sketch "Sketch5" against normal through all contours A1 L3 L24 A13 L22 L14 A6 L10 A5 L11 A8 L12 A7 L13 A4 L4 A0 L2 A2 L6 A3 L1 | L1 A3 L6 A2 L2 A0 L4 A4 L19 A11 L18 A12 L17 A9 L16 A10 L20 L23 A13 L24 L3 A1 | A13 | L23 L20 A10 L16 A9 L17 A12 L18 A11 L19 A4 L25 A13
equation "\"BendRadius\" = Thickness"
equation "\"BendReliefWidth\" = Thickness"
equation "\"BendReliefDepth\" = 0.5 * Thickness"
equation "\"CornerReliefSize\" = 4 * Thickness"
equation "\"MinimumRemnant\" = 2 * Thickness"
equation "\"TransitionRadius\" = BendRadius"
equation "\"JacobiRadiusSize\" = BendRadius"
equation "\"GapSize\" = Thickness"
equation "\"Thickness\" = 0.5"
properties part number "Ring B-1" material "Wood (Maple)"
